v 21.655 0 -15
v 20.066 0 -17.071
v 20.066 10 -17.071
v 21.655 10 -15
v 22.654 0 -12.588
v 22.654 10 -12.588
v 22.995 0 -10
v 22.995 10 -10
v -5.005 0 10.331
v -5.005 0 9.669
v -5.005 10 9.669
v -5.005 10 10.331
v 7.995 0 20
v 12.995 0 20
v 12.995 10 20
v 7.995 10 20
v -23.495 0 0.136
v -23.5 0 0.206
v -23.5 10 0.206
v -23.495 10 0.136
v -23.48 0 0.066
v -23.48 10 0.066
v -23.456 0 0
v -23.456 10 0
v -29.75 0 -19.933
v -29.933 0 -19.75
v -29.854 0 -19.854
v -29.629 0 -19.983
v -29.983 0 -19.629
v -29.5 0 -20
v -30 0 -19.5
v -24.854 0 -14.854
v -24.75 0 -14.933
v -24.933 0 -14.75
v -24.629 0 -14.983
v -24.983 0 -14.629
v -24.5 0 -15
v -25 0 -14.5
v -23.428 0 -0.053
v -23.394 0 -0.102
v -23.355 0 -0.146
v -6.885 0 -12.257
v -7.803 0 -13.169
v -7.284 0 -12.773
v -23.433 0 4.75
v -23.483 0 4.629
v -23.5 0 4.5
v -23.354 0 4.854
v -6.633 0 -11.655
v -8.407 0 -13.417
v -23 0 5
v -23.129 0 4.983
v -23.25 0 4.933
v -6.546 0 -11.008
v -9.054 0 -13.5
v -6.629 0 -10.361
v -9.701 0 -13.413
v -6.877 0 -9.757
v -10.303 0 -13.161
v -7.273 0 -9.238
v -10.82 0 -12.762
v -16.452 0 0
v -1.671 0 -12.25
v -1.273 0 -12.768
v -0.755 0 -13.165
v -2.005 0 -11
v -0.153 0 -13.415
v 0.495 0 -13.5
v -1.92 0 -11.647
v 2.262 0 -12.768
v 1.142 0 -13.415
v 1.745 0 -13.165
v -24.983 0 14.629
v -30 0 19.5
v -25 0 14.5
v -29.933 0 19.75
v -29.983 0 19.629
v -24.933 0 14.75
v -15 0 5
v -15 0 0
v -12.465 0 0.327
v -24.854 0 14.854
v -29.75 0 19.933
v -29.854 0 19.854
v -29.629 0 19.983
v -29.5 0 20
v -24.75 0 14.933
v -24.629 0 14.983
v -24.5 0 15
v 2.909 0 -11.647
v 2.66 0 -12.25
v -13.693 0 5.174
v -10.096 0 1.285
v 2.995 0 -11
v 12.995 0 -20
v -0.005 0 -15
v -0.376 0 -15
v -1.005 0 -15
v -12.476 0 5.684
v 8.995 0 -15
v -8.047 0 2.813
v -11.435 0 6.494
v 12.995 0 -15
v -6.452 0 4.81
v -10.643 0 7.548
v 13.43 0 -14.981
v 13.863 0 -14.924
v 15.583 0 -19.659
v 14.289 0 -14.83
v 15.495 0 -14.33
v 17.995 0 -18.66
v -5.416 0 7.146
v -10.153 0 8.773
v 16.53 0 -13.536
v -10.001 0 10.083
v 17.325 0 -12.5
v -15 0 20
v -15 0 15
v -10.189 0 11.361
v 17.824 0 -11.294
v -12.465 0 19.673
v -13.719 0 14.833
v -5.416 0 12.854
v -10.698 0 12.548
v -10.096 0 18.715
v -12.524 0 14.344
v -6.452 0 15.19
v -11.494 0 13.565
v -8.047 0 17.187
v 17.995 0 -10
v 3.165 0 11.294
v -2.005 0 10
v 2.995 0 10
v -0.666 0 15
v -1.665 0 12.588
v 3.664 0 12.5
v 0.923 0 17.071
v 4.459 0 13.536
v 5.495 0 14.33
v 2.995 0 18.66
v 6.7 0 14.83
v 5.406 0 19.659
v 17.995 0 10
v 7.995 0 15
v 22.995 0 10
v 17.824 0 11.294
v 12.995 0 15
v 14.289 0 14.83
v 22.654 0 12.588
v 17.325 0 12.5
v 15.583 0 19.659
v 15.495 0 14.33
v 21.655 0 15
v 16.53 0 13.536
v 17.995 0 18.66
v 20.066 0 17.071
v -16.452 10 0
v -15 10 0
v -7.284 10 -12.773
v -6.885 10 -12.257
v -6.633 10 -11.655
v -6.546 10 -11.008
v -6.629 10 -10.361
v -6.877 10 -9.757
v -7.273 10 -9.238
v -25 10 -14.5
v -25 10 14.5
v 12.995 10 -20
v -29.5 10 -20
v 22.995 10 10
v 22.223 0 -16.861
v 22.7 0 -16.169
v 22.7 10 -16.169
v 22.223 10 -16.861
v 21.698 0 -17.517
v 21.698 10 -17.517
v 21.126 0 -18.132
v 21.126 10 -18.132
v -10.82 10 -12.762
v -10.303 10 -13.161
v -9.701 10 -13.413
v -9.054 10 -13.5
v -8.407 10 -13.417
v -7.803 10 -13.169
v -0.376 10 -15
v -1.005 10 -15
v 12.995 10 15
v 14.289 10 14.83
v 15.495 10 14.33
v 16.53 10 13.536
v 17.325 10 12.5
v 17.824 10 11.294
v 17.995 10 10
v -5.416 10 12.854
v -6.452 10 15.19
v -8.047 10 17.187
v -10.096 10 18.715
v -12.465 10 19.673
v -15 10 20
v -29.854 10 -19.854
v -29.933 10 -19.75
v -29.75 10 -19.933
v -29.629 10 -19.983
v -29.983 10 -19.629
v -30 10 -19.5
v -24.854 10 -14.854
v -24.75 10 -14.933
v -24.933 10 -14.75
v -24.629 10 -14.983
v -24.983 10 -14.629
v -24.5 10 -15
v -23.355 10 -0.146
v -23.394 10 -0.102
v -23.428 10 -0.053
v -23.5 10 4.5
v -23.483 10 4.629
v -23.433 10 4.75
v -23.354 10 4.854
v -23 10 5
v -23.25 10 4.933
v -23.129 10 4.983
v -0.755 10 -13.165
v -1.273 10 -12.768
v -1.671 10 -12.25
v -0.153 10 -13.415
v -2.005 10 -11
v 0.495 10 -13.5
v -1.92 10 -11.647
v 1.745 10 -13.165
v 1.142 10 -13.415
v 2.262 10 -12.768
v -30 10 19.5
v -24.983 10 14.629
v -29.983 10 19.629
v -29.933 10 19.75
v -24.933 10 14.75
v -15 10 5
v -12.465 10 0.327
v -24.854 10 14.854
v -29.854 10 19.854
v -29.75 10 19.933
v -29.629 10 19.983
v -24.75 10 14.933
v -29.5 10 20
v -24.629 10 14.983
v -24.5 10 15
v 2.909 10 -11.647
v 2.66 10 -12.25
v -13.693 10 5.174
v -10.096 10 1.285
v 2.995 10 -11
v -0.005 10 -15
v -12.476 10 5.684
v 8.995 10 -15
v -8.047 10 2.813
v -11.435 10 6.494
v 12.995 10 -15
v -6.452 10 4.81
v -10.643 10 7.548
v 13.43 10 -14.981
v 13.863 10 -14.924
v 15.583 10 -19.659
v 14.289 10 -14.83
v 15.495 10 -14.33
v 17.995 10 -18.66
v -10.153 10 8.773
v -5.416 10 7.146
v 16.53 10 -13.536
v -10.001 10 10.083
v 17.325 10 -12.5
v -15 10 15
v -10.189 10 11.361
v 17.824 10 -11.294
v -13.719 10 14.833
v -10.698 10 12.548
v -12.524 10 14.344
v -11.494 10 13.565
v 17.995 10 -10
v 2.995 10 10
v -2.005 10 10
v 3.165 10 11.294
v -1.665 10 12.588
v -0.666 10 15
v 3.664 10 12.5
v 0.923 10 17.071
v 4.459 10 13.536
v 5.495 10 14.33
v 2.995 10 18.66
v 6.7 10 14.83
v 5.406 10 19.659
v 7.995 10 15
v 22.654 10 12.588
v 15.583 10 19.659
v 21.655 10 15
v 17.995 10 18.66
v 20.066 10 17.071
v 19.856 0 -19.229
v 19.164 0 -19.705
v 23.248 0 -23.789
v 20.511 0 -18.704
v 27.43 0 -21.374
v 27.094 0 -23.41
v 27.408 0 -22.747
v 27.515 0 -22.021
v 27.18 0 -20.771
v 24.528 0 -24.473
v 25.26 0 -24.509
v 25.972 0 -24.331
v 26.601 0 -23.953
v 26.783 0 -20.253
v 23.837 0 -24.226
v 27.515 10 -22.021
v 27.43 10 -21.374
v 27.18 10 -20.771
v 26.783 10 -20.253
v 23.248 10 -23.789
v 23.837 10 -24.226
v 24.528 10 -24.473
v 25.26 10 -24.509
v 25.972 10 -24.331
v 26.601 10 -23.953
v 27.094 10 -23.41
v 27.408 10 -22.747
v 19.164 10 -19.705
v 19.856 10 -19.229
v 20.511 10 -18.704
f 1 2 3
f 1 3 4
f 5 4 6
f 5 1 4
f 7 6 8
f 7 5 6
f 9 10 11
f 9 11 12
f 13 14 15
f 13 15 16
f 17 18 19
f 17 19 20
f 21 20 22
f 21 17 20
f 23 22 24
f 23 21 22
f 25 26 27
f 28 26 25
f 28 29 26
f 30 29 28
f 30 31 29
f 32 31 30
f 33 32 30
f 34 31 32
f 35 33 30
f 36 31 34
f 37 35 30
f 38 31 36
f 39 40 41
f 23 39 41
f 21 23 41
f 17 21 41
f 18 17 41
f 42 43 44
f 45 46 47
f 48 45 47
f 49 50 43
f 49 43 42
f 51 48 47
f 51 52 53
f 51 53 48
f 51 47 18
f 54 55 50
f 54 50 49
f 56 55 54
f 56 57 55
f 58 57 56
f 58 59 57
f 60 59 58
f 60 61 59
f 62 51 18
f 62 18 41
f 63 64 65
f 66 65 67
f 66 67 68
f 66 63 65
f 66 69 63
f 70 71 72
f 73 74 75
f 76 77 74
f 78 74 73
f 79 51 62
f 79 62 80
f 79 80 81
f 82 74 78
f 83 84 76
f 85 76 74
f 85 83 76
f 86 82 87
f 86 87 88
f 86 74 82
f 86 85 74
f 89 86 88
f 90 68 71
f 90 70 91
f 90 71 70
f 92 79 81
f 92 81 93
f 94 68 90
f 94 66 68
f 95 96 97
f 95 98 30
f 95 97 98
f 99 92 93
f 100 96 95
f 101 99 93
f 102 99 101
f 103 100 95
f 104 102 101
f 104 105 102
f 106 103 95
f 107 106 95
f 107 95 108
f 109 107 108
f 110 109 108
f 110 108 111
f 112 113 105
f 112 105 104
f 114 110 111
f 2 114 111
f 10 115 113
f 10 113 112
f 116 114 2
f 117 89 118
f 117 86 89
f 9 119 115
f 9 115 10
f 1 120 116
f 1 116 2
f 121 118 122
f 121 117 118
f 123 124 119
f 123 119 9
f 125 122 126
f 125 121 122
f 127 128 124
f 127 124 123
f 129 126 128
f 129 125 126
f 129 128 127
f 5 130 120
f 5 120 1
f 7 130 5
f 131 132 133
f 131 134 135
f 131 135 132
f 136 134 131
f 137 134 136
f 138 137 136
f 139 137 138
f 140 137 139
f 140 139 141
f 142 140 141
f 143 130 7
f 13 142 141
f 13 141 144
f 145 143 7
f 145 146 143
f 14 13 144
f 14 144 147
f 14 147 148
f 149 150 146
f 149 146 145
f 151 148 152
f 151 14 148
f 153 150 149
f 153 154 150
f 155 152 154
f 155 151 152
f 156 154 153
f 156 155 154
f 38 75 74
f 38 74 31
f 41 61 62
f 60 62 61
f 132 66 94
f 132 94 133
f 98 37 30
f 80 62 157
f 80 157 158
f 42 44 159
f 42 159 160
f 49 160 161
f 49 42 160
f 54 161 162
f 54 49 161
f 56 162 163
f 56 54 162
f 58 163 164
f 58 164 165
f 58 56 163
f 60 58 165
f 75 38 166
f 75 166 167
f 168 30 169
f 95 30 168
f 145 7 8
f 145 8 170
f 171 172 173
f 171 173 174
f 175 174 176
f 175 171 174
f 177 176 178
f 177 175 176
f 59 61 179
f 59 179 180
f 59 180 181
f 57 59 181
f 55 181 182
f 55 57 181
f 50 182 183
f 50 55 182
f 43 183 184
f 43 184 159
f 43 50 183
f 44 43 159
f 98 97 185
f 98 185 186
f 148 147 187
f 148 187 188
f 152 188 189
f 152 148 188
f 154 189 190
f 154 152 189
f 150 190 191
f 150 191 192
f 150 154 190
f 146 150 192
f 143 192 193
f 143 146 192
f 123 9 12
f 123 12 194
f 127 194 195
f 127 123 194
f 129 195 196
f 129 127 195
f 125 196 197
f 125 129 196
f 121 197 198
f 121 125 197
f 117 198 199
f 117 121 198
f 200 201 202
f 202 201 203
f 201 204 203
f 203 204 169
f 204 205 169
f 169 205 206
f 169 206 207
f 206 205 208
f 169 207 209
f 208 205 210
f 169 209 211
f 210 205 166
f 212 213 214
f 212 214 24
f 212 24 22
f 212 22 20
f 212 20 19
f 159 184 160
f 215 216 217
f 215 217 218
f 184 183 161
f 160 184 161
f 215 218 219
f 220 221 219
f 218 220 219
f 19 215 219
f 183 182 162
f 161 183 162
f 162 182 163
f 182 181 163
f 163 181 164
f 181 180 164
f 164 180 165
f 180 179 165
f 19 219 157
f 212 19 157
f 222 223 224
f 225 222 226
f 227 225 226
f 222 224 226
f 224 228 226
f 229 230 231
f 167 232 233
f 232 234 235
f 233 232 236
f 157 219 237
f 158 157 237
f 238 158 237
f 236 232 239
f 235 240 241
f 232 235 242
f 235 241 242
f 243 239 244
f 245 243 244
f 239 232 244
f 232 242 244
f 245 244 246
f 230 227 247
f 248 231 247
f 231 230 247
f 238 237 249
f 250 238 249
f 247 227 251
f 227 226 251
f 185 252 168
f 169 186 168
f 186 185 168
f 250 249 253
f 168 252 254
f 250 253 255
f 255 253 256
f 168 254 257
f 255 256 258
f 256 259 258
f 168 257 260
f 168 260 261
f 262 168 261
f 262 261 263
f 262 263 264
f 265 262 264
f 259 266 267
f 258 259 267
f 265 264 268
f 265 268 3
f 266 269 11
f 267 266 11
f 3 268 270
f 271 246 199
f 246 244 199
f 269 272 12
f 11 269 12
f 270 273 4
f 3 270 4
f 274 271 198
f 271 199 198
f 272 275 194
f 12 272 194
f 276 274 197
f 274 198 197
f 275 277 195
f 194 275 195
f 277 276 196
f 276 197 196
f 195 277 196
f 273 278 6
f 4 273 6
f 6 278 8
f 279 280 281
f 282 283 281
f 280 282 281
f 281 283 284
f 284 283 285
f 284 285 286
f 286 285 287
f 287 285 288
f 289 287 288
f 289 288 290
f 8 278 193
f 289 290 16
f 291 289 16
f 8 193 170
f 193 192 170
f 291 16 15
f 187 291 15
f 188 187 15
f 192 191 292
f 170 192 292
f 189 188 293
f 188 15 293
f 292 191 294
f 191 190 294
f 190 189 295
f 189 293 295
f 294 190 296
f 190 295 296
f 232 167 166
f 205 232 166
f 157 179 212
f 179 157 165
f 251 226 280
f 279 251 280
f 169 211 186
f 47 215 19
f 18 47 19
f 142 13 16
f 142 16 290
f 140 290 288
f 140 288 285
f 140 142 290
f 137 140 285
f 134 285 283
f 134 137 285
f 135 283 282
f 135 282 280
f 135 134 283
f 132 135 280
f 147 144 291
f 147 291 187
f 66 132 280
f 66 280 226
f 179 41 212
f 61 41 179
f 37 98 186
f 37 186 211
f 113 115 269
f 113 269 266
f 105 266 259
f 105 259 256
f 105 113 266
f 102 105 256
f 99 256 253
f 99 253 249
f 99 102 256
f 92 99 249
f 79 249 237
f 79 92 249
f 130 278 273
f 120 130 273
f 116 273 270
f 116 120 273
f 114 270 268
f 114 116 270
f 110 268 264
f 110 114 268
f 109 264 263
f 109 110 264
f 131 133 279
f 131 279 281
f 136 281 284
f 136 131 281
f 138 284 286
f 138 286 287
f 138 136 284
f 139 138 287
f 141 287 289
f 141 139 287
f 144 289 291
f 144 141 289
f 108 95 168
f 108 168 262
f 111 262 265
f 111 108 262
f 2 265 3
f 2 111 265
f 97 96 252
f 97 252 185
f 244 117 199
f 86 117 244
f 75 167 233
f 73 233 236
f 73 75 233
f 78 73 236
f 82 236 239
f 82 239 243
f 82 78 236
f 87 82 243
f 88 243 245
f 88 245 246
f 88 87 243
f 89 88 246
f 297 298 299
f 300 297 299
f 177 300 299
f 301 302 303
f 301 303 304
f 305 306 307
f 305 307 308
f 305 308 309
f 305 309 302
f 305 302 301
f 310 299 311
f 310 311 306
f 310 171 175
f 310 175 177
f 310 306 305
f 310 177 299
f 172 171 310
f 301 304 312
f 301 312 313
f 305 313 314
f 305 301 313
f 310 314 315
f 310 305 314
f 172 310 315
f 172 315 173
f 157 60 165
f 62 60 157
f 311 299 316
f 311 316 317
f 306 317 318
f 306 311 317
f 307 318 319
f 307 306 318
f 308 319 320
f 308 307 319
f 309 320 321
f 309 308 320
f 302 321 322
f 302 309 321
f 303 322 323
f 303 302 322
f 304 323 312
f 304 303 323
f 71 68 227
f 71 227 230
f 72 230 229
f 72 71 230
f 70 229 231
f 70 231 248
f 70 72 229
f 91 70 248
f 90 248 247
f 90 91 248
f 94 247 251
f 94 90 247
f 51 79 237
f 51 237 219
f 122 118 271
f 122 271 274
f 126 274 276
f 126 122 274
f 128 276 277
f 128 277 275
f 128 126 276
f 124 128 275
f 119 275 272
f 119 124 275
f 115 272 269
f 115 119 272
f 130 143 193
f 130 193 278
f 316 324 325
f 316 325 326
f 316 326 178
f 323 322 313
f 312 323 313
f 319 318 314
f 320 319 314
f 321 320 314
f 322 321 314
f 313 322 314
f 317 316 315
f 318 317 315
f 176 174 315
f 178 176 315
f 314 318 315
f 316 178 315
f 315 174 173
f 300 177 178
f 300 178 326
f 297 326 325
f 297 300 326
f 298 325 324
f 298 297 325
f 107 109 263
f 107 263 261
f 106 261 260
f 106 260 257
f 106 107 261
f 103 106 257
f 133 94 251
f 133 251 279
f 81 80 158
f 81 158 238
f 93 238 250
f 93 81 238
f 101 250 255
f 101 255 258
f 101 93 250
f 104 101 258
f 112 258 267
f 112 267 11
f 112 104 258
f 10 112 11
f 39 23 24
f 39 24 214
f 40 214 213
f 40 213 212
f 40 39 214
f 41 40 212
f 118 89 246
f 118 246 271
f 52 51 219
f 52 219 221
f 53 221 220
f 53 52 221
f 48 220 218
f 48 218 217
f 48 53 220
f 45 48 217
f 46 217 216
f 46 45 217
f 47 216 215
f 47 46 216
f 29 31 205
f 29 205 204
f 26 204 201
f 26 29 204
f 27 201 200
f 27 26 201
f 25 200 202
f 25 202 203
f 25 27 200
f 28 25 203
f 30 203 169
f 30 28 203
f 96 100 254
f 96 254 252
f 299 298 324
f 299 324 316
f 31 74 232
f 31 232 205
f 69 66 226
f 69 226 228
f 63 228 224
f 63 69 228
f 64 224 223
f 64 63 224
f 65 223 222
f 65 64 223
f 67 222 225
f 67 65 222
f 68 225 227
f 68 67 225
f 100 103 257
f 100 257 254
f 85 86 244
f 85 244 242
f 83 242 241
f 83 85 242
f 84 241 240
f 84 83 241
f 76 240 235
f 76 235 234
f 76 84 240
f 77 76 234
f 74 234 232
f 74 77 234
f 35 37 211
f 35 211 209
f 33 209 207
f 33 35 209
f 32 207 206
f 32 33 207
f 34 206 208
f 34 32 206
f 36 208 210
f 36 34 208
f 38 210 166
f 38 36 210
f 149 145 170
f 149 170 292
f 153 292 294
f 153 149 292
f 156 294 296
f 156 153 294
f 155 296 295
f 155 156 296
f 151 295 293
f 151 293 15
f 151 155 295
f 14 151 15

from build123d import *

# Parameters (mm, degrees)
F1_DEPTH = 10


# Not quite as in the source:
# - ends of sketch curves that miss each other by under 0.0002 mm in the source are joined


with BuildPart() as f1:
    # F0 (on Front) → F1 (new body)
    with BuildSketch(Plane.XZ):
        with BuildLine():
            Line((-25, -14.4999996647), (-25, 14.5))
            ThreePointArc((-25, 14.5), (-24.8535533906, 14.8535533906), (-24.5, 15))
            Line((-24.5, 15), (-15, 15))
            ThreePointArc((-15, 15), (-11.493877298, 13.5647024558), (-10.0006863175, 10.0828414395))
            ThreePointArc((-10.0006863175, 10.0828414395), (-11.4352975442, 6.493877298), (-15, 5))
            Line((-15, 5), (-23, 5))
            ThreePointArc((-23, 5), (-23.3535533906, 4.8535533906), (-23.5, 4.5))
            Line((-23.5, 4.5), (-23.5, 0.2061669839))
            ThreePointArc((-23.5, 0.2061669839), (-23.4887525914, 0.1007112853), (-23.4555163825, 0))
            Line((-23.4555163825, 0), (-16.4515272404, 0))
            Line((-16.4515272404, 0), (-15, 0))
            ThreePointArc((-15, 0), (-8.0470582749, 2.8127473004), (-5.0054901633, 9.6686797265))
            Line((-5.0054901633, 9.6686797265), (-5.0054901633, 10.3313202735))
            ThreePointArc((-5.0054901633, 10.3313202735), (-8.0470582749, 17.1872526996), (-15, 20))
            Line((-15, 20), (-25, 20))
            Line((-25, 20), (-29.5000011921, 20))
            ThreePointArc((-29.5000011921, 20), (-29.8535545827, 19.8535533906), (-30.0000011921, 19.5))
            Line((-30.0000011921, 19.5), (-30.0000011921, 17.5))
            Line((-30.0000011921, 17.5), (-30.0000011921, -19.5))
            ThreePointArc((-30.0000011921, -19.5), (-29.8535545827, -19.8535533906), (-29.5000011921, -20))
            Line((-29.5000011921, -20), (-25, -20))
            Line((-25, -20), (-2.0054901633, -20))
            Line((-2.0054901633, -20), (-0.3755952516, -20))
            Line((-0.3755952516, -20), (8.9945098367, -20))
            Line((8.9945098367, -20), (12.9945098367, -20))
            ThreePointArc((12.9945098367, -20), (16.8213441604, -19.2387953251), (20.0655776486, -17.0710678119))
            ThreePointArc((20.0655776486, -17.0710678119), (22.2333051618, -13.8268343237), (22.9945098367, -10))
            Line((22.9945098367, -10), (22.9945098367, 10))
            ThreePointArc((22.9945098367, 10), (20.0655776486, 17.0710678119), (12.9945098367, 20))
            Line((12.9945098367, 20), (7.9945098367, 20))
            ThreePointArc((7.9945098367, 20), (0.9234420249, 17.0710678119), (-2.0054901633, 10))
            Line((-2.0054901633, 10), (-2.0054901633, -11.0000000643))
            ThreePointArc((-2.0054901633, -11.0000000643), (-1.2732571162, -12.7677670173), (0.4945098367, -13.5000000643))
            ThreePointArc((0.4945098367, -13.5000000643), (2.262277125, -12.7677670173), (2.994510172, -11.0000000643))
            Line((2.994510172, -11.0000000643), (2.994510172, 10))
            ThreePointArc((2.994510172, 10), (4.4589761679, 13.5355336689), (7.9945098367, 14.9999996647))
            Line((7.9945098367, 14.9999996647), (12.9945098367, 14.9999996647))
            ThreePointArc((12.9945098367, 14.9999996647), (16.5300435056, 13.5355336689), (17.9945095014, 10))
            Line((17.9945095014, 10), (17.9945095014, -10))
            ThreePointArc((17.9945095014, -10), (16.9612762133, -13.0438070177), (14.2886047885, -14.8296288577))
            ThreePointArc((14.2886047885, -14.8296288577), (13.6471406581, -14.9572239871), (12.9945098367, -14.9999996647))
            Line((12.9945098367, -14.9999996647), (8.9945098367, -14.9999996647))
            Line((8.9945098367, -14.9999996647), (-0.0054901633, -15.0000000878))
            Line((-0.0054901633, -15.0000000878), (-0.3755952516, -15.0000001052))
            Line((-0.3755952516, -15.0000001052), (-1.0054901633, -15.0000001348))
            Line((-1.0054901633, -15.0000001348), (-24.5, -14.9999996647))
            ThreePointArc((-24.5, -14.9999996647), (-24.8535533906, -14.8535530553), (-25, -14.4999996647))
        make_face()
        with BuildLine():
            Line((-16.4515272404, 0), (-23.4555163825, 0))
            ThreePointArc((-23.4555163825, 0), (-23.4116485183, -0.0776384025), (-23.3546867552, -0.1462493971))
            Line((-23.3546867552, -0.1462493971), (-10.8196093867, -12.7620815701))
            ThreePointArc((-10.8196093867, -12.7620815701), (-9.0542025953, -13.4999867782), (-7.284093705, -12.773433441))
            ThreePointArc((-7.284093705, -12.773433441), (-6.5461885926, -11.0080267446), (-7.2727419298, -9.2379178544))
            Line((-7.2727419298, -9.2379178544), (-16.4515272404, 0))
        make_face()
    extrude(amount=-F1_DEPTH)


with BuildPart() as f1b:
    # F0 (on Front) → F1, piece 2 (new body)
    with BuildSketch(Plane.XZ):
        with BuildLine():
            ThreePointArc((26.7830920699, -20.2530483272), (25.0153251169, -19.5208152802), (23.2475581639, -20.2530483272))
            ThreePointArc((23.2475581639, -20.2530483272), (22.5153251169, -22.0208152802), (23.2475581639, -23.7885822331))
            ThreePointArc((23.2475581639, -23.7885822331), (25.9720336978, -24.3305141114), (27.5153251169, -22.0208152802))
            ThreePointArc((27.5153251169, -22.0208152802), (27.3250239482, -21.0641066993), (26.7830920699, -20.2530483272))
        make_face()
        with BuildLine():
            Line((21.1262378204, -18.1317279836), (22.9945098367, -20))
            Line((22.9945098367, -20), (23.2475581639, -20.2530483272))
            ThreePointArc((23.2475581639, -20.2530483272), (25.0153251169, -19.5208152802), (26.7830920699, -20.2530483272))
            Line((26.7830920699, -20.2530483272), (22.6995307229, -16.1694869802))
            ThreePointArc((22.6995307229, -16.1694869802), (21.9666890592, -17.193747285), (21.1262378204, -18.1317279836))
        make_face()
        with BuildLine():
            Line((19.4589759308, -20), (22.9945098367, -20))
            Line((22.9945098367, -20), (21.1262378204, -18.1317279836))
            ThreePointArc((21.1262378204, -18.1317279836), (20.1882571217, -18.9721792225), (19.163996817, -19.7050208862))
            Line((19.163996817, -19.7050208862), (19.4589759308, -20))
        make_face()
        with BuildLine():
            Line((23.2475581639, -20.2530483272), (22.9945098367, -20))
            Line((22.9945098367, -20), (19.4589759308, -20))
            Line((19.4589759308, -20), (23.2475581639, -23.7885822331))
            ThreePointArc((23.2475581639, -23.7885822331), (22.5153251169, -22.0208152802), (23.2475581639, -20.2530483272))
        make_face()
    extrude(amount=-F1_DEPTH)


solid = Compound([f1.part, f1b.part])
